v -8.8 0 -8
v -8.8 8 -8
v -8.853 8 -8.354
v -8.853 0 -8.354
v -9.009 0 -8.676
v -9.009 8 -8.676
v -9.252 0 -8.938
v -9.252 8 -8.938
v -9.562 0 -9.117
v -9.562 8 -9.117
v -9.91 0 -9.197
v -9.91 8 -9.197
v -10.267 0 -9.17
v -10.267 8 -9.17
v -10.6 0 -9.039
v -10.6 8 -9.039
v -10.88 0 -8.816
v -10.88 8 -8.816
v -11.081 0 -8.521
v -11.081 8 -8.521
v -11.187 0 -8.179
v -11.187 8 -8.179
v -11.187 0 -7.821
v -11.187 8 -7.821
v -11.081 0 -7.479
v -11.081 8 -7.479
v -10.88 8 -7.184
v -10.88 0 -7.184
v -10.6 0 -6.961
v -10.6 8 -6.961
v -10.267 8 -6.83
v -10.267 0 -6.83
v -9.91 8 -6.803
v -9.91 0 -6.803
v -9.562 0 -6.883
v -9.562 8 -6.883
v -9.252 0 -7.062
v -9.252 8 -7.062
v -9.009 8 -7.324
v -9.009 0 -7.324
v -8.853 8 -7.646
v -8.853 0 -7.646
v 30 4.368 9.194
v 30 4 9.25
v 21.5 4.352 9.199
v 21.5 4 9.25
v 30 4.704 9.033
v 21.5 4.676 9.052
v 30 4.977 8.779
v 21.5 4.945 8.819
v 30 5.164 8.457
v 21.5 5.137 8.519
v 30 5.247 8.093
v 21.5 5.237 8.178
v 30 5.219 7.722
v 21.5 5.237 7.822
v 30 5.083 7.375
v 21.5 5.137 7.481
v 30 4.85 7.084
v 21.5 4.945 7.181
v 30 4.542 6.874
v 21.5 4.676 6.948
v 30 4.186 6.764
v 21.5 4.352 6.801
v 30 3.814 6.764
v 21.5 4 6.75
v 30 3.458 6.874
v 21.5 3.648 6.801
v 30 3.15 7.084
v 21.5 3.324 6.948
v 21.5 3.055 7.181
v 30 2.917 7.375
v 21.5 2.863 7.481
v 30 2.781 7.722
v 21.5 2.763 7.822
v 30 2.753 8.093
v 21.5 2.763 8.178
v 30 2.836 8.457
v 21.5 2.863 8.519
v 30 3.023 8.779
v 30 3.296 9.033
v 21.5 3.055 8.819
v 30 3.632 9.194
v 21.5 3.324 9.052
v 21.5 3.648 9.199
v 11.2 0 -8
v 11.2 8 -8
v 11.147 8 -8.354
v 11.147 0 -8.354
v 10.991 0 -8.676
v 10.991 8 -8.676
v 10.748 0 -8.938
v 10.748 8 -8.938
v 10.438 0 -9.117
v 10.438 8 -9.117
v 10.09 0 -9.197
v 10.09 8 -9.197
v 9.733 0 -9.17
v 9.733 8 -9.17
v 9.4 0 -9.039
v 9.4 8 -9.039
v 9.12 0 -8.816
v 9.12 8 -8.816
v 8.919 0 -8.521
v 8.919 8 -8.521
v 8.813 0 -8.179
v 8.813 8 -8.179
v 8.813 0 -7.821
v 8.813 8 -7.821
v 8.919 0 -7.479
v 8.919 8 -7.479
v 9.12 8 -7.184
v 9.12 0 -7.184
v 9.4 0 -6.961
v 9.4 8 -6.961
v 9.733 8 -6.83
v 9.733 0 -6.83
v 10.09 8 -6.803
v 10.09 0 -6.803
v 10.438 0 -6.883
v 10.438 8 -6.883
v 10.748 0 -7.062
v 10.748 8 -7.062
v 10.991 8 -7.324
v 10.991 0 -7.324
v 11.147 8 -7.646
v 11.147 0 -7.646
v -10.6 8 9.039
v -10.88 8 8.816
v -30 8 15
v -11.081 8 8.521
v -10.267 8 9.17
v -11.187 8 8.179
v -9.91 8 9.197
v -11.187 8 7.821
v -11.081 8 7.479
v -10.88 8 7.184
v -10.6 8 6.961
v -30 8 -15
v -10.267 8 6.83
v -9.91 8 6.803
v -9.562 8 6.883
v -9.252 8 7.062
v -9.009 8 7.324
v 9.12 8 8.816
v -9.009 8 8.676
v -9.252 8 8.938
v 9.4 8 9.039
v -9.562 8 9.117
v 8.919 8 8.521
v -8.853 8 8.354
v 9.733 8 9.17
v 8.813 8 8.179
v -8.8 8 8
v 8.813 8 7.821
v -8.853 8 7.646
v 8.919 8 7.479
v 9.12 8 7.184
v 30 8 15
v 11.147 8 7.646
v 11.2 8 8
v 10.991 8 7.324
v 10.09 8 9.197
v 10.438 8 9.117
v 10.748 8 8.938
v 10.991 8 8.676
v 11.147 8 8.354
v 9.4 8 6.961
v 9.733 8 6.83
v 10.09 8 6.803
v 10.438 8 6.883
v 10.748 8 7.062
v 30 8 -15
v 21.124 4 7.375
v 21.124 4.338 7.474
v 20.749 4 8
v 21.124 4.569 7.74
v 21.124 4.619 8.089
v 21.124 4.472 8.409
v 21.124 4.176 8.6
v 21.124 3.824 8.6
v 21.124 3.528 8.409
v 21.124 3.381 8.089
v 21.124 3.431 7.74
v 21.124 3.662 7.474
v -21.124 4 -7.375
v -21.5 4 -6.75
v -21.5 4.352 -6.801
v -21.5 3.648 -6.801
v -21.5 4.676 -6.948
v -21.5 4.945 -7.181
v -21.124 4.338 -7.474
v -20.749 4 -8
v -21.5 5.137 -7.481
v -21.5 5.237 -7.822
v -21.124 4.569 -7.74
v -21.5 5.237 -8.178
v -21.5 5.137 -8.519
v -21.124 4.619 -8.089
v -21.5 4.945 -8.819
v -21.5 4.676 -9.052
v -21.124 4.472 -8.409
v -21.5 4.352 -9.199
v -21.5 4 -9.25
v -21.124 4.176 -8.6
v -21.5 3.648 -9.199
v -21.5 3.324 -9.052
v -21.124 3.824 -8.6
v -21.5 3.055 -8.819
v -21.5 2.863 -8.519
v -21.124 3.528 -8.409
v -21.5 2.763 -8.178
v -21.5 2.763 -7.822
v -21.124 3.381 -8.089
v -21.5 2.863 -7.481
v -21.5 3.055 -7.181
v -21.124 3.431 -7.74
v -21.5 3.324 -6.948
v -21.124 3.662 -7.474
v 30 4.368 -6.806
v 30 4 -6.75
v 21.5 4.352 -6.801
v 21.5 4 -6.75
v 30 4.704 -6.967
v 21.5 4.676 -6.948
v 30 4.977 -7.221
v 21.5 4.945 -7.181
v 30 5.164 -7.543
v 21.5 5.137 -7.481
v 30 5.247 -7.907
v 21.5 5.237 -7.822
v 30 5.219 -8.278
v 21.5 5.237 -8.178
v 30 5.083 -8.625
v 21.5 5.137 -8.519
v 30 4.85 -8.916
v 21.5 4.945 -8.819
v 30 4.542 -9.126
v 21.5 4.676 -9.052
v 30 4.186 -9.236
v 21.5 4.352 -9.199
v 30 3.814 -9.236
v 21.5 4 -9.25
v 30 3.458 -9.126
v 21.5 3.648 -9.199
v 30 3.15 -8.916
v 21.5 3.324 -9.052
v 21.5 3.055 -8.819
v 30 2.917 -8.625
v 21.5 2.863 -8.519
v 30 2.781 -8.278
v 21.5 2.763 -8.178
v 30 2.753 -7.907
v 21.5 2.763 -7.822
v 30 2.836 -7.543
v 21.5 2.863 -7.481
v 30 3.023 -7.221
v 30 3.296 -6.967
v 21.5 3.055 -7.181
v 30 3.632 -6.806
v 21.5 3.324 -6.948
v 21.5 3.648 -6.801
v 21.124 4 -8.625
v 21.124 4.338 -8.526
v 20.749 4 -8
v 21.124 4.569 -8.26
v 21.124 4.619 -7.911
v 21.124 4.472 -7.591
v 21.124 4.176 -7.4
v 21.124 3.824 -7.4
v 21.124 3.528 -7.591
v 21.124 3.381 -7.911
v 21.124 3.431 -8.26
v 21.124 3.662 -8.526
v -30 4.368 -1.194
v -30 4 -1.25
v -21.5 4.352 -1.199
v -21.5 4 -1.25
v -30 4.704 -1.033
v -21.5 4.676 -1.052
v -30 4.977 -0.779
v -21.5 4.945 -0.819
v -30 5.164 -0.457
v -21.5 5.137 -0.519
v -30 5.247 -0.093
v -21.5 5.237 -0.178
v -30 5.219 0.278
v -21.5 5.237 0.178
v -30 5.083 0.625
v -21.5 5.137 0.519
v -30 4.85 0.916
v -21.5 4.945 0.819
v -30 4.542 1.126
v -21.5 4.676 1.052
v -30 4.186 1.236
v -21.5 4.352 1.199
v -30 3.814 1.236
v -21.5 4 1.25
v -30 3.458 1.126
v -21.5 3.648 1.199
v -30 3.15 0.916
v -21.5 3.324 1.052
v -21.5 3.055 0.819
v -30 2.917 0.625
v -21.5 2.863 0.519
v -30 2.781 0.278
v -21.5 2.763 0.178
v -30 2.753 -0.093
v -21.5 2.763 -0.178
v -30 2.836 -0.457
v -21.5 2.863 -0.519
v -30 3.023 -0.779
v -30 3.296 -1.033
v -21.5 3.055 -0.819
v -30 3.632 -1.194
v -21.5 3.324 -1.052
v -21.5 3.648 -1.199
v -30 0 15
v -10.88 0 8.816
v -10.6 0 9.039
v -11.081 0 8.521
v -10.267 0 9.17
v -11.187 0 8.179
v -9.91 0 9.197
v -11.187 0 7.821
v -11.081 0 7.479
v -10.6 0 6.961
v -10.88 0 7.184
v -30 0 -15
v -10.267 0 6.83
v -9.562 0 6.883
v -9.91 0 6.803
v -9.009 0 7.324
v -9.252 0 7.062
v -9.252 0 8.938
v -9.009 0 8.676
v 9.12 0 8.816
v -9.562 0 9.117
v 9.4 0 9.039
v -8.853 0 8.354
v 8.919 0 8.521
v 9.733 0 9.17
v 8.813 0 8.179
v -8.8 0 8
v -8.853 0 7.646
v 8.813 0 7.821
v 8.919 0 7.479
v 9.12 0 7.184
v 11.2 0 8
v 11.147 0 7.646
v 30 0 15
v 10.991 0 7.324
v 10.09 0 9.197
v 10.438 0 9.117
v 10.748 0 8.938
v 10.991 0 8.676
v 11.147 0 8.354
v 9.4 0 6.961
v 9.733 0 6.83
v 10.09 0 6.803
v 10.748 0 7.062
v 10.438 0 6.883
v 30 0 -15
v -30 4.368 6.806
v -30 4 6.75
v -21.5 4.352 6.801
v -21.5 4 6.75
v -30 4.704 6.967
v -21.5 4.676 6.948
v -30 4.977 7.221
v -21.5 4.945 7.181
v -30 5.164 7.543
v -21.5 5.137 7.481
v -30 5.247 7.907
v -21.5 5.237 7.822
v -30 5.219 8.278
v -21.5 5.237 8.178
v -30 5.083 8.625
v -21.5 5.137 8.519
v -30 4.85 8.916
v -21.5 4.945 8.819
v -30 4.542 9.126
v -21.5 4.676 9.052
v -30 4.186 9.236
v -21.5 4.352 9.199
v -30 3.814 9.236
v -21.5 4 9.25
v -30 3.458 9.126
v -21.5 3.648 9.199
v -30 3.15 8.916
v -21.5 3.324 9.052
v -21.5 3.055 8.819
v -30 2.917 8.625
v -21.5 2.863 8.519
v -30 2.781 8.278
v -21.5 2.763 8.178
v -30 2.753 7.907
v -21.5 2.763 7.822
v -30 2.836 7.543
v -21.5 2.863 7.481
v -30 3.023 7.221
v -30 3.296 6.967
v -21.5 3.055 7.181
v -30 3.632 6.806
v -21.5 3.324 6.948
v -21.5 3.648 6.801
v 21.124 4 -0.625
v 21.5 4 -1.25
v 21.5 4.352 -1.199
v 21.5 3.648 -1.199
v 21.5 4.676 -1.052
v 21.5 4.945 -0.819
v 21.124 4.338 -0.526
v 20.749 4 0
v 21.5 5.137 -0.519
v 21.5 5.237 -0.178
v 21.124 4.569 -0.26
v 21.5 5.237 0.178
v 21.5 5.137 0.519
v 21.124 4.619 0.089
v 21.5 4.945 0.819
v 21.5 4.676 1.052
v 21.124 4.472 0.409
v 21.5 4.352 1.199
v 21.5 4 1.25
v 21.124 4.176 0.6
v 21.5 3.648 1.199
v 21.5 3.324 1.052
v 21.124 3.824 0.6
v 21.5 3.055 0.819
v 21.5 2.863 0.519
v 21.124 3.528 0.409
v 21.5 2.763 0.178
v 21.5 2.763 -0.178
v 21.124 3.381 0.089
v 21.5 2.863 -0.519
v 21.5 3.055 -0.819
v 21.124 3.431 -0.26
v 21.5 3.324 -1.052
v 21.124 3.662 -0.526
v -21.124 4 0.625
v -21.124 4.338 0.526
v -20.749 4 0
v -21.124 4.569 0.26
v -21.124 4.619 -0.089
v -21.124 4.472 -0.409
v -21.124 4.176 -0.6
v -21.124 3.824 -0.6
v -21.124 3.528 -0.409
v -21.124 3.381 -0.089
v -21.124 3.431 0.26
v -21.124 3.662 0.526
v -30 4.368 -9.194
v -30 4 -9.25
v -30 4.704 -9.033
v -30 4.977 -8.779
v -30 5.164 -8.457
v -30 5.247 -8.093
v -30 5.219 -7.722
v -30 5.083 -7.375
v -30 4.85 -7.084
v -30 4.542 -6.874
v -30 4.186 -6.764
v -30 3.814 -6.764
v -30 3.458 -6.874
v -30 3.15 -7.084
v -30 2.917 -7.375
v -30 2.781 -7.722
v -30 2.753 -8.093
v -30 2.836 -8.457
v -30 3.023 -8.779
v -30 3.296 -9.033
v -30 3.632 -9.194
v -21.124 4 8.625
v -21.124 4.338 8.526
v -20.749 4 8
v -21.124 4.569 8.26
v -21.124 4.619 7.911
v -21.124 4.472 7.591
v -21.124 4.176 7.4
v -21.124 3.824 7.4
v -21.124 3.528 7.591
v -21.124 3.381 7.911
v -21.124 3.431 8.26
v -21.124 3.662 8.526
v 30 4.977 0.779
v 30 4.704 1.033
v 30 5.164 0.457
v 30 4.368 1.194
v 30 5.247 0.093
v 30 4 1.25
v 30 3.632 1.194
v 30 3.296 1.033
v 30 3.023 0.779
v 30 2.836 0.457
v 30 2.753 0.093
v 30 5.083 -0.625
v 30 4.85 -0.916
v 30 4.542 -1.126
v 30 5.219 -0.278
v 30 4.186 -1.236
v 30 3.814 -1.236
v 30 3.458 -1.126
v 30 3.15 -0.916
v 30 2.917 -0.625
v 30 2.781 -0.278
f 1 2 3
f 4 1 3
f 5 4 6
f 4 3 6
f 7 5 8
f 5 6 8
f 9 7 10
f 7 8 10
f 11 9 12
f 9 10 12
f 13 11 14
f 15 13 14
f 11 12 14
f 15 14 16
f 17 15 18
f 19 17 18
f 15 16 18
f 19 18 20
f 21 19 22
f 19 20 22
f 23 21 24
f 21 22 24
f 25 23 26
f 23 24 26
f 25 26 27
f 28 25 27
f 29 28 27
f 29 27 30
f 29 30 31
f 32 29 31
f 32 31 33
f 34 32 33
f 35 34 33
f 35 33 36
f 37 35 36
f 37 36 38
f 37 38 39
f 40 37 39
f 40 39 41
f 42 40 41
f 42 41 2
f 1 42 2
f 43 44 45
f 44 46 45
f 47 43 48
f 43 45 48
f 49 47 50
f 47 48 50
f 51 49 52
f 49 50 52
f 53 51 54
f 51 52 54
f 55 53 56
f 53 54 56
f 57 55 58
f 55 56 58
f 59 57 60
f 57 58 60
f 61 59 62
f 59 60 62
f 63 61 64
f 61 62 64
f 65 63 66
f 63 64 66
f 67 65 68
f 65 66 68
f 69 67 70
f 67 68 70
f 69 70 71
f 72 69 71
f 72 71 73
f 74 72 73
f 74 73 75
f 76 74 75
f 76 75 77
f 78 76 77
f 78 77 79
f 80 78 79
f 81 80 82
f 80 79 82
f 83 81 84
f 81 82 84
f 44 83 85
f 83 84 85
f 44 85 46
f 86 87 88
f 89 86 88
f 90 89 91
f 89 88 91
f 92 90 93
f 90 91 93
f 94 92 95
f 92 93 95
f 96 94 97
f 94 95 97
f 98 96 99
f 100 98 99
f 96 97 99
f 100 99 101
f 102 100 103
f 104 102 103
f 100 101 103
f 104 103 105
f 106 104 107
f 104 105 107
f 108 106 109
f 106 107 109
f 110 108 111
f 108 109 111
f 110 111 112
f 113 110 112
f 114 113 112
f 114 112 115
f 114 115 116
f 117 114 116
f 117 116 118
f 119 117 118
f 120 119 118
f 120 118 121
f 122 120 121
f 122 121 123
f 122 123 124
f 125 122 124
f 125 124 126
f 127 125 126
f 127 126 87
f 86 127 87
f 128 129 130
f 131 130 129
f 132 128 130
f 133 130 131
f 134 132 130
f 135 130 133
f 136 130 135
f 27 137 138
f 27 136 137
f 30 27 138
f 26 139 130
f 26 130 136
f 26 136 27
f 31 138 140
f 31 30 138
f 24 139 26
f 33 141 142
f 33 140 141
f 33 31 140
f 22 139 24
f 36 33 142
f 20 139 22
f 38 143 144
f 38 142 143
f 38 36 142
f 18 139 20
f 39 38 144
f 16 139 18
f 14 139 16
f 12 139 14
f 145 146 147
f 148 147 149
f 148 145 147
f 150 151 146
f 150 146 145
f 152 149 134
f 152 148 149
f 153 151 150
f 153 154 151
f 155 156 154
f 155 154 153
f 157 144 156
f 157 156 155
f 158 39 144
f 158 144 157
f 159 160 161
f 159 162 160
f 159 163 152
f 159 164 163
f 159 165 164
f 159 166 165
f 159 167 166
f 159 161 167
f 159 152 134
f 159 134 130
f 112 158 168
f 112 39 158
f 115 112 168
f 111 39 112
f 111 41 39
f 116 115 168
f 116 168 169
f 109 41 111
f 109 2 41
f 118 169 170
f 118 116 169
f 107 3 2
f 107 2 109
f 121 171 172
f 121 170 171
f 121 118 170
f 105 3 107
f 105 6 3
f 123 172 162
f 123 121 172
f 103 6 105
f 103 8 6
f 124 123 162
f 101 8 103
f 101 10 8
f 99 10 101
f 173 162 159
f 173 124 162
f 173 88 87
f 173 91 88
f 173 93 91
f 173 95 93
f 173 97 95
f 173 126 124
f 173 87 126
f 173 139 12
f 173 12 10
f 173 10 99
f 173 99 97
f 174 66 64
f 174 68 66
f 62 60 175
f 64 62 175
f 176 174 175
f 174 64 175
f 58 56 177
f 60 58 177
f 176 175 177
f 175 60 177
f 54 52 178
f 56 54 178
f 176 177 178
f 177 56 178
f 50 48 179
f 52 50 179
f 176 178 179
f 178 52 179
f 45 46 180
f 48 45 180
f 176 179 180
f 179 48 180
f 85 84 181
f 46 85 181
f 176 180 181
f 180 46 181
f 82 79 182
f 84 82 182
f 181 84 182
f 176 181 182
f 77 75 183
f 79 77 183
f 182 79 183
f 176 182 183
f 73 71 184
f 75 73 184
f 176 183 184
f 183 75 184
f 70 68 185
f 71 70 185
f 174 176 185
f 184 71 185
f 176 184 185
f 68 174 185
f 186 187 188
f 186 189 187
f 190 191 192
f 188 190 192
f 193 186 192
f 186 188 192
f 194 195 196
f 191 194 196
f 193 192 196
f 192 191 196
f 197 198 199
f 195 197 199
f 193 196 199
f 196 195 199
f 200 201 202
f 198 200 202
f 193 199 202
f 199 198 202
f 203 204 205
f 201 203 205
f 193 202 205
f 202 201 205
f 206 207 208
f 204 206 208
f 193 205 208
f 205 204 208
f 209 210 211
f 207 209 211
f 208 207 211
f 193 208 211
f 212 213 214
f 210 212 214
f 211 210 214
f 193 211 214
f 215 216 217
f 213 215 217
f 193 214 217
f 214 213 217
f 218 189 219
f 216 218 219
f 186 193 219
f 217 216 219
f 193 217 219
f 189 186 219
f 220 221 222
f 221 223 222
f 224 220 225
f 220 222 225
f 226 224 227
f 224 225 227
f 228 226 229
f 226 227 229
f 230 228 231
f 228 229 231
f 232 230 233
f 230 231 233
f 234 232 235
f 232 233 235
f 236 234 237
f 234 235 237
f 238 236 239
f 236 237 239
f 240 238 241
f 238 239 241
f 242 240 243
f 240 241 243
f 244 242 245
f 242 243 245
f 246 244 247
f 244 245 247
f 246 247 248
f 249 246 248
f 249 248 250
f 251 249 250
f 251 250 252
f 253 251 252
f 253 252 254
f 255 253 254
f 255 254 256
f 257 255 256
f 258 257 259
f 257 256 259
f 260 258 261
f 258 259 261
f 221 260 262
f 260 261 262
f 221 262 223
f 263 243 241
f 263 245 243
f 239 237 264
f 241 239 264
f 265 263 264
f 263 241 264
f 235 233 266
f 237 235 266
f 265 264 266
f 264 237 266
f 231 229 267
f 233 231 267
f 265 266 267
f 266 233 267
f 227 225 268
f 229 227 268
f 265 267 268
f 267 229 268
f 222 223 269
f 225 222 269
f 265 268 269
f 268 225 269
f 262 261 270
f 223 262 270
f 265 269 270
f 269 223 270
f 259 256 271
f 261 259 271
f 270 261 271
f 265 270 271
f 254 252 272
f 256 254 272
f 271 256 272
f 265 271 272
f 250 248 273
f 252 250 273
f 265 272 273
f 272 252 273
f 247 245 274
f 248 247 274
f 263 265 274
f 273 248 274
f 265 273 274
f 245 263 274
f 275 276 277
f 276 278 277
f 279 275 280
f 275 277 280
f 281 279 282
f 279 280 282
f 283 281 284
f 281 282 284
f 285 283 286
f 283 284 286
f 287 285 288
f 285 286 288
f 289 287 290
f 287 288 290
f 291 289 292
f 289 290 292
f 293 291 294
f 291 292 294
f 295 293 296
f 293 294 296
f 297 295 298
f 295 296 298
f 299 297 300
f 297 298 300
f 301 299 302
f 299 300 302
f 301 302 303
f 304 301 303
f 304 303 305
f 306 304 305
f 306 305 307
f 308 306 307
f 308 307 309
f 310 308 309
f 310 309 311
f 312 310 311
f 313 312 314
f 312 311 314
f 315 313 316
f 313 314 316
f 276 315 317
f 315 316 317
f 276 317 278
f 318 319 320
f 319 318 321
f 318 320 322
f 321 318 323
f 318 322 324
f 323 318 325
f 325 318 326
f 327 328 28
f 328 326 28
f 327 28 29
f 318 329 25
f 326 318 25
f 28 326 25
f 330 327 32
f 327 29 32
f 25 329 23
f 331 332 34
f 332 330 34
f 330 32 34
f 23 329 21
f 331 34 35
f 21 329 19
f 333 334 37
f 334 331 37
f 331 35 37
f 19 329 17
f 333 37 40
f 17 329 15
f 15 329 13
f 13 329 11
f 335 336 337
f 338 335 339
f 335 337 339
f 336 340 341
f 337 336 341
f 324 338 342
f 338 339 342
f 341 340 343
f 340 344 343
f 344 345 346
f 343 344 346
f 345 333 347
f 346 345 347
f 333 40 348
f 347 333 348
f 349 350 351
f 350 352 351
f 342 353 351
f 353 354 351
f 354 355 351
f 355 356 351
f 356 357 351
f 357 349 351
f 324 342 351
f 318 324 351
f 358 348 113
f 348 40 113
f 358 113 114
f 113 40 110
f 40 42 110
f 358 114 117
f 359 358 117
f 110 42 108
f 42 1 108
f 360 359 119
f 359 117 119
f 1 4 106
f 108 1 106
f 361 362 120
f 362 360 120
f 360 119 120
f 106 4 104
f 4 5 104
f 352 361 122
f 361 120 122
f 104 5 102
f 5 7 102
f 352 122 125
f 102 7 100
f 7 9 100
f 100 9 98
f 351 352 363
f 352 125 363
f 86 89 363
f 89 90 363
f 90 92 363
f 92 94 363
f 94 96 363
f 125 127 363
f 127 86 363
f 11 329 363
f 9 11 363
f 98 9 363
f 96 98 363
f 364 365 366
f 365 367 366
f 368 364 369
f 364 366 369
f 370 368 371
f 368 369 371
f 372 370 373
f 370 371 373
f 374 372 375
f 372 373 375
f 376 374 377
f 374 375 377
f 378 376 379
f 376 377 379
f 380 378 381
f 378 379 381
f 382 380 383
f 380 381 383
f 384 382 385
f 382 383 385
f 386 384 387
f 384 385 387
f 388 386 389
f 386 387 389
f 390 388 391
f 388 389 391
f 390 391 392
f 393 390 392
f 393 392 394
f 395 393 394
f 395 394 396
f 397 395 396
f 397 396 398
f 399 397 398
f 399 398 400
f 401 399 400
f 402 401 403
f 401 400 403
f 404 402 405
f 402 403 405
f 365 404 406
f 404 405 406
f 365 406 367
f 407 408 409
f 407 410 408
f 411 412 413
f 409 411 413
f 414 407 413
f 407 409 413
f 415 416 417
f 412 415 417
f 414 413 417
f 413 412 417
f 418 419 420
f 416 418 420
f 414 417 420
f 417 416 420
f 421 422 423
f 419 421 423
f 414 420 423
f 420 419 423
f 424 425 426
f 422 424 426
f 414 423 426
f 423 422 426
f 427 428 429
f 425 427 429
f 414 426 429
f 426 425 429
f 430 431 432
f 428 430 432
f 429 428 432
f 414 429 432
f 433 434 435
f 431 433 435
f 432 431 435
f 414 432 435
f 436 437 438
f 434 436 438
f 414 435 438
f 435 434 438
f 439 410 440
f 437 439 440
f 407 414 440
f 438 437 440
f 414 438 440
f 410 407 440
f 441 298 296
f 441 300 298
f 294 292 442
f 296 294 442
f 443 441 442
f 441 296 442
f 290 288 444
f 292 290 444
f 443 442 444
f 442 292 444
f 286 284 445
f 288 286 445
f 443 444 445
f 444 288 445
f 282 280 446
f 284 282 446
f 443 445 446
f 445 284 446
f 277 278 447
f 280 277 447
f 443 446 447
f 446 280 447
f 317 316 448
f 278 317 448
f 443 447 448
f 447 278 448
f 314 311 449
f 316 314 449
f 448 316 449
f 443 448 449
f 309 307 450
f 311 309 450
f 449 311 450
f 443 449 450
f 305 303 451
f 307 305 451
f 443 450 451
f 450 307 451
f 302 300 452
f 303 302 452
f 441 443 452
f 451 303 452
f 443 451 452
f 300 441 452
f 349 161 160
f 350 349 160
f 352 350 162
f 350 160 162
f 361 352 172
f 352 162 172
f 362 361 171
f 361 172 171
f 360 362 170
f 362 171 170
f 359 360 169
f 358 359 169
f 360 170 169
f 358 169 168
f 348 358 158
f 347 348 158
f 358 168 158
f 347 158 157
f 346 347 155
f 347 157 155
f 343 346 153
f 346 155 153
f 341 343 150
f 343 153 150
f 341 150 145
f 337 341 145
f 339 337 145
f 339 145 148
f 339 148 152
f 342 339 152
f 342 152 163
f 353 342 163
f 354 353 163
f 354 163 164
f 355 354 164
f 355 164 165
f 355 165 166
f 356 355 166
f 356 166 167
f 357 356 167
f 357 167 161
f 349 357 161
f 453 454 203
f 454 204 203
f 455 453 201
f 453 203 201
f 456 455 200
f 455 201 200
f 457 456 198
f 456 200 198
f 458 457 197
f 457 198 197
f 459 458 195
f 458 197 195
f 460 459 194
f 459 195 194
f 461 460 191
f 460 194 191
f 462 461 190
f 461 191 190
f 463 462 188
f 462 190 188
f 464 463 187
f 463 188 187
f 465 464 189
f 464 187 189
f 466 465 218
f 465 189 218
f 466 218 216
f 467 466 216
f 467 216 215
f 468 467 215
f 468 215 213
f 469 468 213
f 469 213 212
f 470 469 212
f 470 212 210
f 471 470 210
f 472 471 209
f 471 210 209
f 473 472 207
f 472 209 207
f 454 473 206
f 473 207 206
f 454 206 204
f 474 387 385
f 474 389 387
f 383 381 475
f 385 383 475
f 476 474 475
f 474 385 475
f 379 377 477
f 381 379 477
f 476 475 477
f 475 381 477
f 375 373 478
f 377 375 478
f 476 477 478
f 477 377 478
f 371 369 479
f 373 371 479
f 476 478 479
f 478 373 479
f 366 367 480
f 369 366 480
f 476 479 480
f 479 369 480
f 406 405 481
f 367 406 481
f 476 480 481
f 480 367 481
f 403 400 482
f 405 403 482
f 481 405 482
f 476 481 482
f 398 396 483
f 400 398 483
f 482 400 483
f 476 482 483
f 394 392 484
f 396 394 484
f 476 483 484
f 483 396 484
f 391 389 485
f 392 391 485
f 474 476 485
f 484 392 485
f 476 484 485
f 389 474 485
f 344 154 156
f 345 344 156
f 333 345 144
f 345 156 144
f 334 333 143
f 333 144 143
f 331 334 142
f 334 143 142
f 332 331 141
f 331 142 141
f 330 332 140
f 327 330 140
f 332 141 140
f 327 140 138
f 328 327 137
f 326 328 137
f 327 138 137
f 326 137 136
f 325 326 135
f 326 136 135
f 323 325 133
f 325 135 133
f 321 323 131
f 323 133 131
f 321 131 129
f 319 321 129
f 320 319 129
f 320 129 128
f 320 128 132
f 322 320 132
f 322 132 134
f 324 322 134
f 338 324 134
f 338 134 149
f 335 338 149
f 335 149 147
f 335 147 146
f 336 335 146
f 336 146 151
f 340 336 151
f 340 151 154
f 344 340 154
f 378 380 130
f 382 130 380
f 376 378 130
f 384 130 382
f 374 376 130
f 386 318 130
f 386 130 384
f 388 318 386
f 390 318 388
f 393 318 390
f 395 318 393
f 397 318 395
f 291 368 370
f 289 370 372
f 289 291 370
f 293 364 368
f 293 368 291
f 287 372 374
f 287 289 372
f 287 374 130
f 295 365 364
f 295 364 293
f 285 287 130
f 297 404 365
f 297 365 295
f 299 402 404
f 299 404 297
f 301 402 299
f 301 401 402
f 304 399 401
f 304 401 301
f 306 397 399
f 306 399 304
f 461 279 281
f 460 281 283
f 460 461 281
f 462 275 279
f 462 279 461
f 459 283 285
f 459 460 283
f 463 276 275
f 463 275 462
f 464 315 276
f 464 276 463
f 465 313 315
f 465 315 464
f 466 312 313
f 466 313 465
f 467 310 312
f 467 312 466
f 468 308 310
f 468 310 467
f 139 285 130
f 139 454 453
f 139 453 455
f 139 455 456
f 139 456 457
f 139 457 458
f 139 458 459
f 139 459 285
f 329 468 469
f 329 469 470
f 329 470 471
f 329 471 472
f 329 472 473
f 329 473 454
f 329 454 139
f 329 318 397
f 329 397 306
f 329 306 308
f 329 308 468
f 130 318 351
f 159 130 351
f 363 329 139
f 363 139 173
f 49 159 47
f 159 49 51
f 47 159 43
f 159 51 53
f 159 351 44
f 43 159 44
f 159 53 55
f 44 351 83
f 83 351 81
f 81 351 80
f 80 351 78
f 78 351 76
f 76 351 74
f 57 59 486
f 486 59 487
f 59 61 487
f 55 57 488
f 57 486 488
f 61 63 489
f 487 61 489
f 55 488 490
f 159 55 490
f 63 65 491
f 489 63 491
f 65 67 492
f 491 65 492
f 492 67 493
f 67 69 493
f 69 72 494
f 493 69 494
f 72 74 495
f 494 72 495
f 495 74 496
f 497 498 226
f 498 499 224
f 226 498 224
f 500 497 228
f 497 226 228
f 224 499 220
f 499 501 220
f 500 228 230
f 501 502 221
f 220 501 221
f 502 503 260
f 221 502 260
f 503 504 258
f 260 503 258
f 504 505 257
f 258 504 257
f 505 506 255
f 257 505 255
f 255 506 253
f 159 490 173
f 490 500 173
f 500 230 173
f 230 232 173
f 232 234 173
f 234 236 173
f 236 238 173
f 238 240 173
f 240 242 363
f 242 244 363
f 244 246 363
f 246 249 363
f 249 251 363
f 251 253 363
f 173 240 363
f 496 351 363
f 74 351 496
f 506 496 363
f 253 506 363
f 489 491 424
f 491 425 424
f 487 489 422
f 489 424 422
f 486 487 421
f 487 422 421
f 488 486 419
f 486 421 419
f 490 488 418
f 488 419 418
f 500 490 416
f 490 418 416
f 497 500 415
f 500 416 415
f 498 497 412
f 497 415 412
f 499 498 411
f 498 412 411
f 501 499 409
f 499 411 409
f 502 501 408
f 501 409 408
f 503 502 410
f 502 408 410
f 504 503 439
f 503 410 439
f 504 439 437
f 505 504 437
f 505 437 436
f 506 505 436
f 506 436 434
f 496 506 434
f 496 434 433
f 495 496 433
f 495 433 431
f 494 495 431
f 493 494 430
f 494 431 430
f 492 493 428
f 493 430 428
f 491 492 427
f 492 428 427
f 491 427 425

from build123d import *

# Parameters (mm, degrees)
SKETCH_1_W             = 60
SKETCH_1_H             = 30
EXTRUDE_1_DEPTH        = 8
CUT_EXTRUDE_1_REACH    = 10
SKETCH_2_R             = 1.2
HOLE_WIZARD_M3_1_D     = 2.5
HOLE_WIZARD_M3_1_DEPTH = 8.5
HOLE_WIZARD_M3_1_TIP   = 0.751075774
HOLE_WIZARD_M3_2_D     = 2.5
HOLE_WIZARD_M3_2_DEPTH = 8.5
HOLE_WIZARD_M3_2_TIP   = 0.751075774


with BuildPart() as part:
    # 스케치1 → 보스-돌출1 (new body)
    with BuildSketch(Plane(origin=(0, 0, 0), x_dir=(1, 0, 0), z_dir=(0, 1, 0))):
        Rectangle(SKETCH_1_W, SKETCH_1_H)
    extrude(amount=EXTRUDE_1_DEPTH)

    # 스케치2 → 컷-돌출1 (cut, up to next)
    with BuildSketch(Plane(origin=(0, 8, 0), x_dir=(1, 0, 0), z_dir=(0, 1, 0)), mode=Mode.PRIVATE) as cut_extrude_1_sk1:
        with Locations((-10, 8)):
            Circle(SKETCH_2_R)
    cut_extrude_1_tool1 = extrude(cut_extrude_1_sk1.sketch, amount=-CUT_EXTRUDE_1_REACH, mode=Mode.PRIVATE) & part.part
    add(cut_extrude_1_tool1.solids().sort_by_distance((-10, 8, -8))[0], mode=Mode.SUBTRACT)
    # 스케치2 → 컷-돌출1 (cut, up to next)
    with BuildSketch(Plane(origin=(0, 8, 0), x_dir=(1, 0, 0), z_dir=(0, 1, 0)), mode=Mode.PRIVATE) as cut_extrude_1_sk2:
        with Locations((10, 8)):
            Circle(SKETCH_2_R)
    cut_extrude_1_tool2 = extrude(cut_extrude_1_sk2.sketch, amount=-CUT_EXTRUDE_1_REACH, mode=Mode.PRIVATE) & part.part
    add(cut_extrude_1_tool2.solids().sort_by_distance((10, 8, -8))[0], mode=Mode.SUBTRACT)
    # 스케치2 → 컷-돌출1 (cut, up to next)
    with BuildSketch(Plane(origin=(0, 8, 0), x_dir=(1, 0, 0), z_dir=(0, 1, 0)), mode=Mode.PRIVATE) as cut_extrude_1_sk3:
        with Locations((10, -8)):
            Circle(SKETCH_2_R)
    cut_extrude_1_tool3 = extrude(cut_extrude_1_sk3.sketch, amount=-CUT_EXTRUDE_1_REACH, mode=Mode.PRIVATE) & part.part
    add(cut_extrude_1_tool3.solids().sort_by_distance((10, 8, 8))[0], mode=Mode.SUBTRACT)
    # 스케치2 → 컷-돌출1 (cut, up to next)
    with BuildSketch(Plane(origin=(0, 8, 0), x_dir=(1, 0, 0), z_dir=(0, 1, 0)), mode=Mode.PRIVATE) as cut_extrude_1_sk4:
        with Locations((-10, -8)):
            Circle(SKETCH_2_R)
    cut_extrude_1_tool4 = extrude(cut_extrude_1_sk4.sketch, amount=-CUT_EXTRUDE_1_REACH, mode=Mode.PRIVATE) & part.part
    add(cut_extrude_1_tool4.solids().sort_by_distance((-10, 8, 8))[0], mode=Mode.SUBTRACT)

    # M3 나사 구멍1
    with Locations(Plane.ZY.offset(30)):
        with Locations((-8, 4), (0, 4), (8, 4)):
            Hole(HOLE_WIZARD_M3_1_D / 2, depth=HOLE_WIZARD_M3_1_DEPTH)
            with Locations((0, 0, -(HOLE_WIZARD_M3_1_DEPTH + HOLE_WIZARD_M3_1_TIP / 2))):  # 118° drill point
                Cone(0, HOLE_WIZARD_M3_1_D / 2, HOLE_WIZARD_M3_1_TIP, mode=Mode.SUBTRACT)

    # M3 나사 구멍2
    with Locations(Plane(origin=(30, 0, 0), x_dir=(0, 0, -1), z_dir=(1, 0, 0))):
        with Locations((-8, 4), (0, 4), (8, 4)):
            Hole(HOLE_WIZARD_M3_2_D / 2, depth=HOLE_WIZARD_M3_2_DEPTH)
            with Locations((0, 0, -(HOLE_WIZARD_M3_2_DEPTH + HOLE_WIZARD_M3_2_TIP / 2))):  # 118° drill point
                Cone(0, HOLE_WIZARD_M3_2_D / 2, HOLE_WIZARD_M3_2_TIP, mode=Mode.SUBTRACT)


solid = part.part
